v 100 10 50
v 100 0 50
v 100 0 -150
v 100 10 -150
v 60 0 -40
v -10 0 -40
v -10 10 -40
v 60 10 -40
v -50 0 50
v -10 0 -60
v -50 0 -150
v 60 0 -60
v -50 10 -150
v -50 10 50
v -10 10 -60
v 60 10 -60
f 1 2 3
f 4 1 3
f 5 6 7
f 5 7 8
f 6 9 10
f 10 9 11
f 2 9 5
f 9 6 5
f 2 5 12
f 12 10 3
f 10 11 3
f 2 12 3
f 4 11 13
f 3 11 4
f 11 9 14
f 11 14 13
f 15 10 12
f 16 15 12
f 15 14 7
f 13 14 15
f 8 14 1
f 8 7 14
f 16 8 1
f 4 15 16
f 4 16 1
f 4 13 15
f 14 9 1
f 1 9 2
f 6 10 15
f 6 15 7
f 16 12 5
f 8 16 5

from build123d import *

# Parameters (mm, degrees)
SKIZZE1_W                            = 150
SKIZZE1_H                            = 200
AUFSATZ_LINEAR_AUSTRAGEN1_DEPTH      = 10
SKIZZE2_W                            = 70
SKIZZE2_H                            = 20
SCHNITT_LINEAR_AUSTRAGEN2_DEPTH      = 1
SCHNITT_LINEAR_AUSTRAGEN2_DEPTH_BACK = 11


with BuildPart() as part:
    # Skizze1 → Aufsatz-Linear austragen1 (new body)
    with BuildSketch(Plane(origin=(0, 0, 0), x_dir=(1, 0, 0), z_dir=(0, 1, 0))):
        with Locations((25, 50)):
            Rectangle(SKIZZE1_W, SKIZZE1_H)
    extrude(amount=AUFSATZ_LINEAR_AUSTRAGEN1_DEPTH)

    # Skizze2 → Schnitt-Linear austragen2 (cut, two sides)
    with BuildSketch(Plane.XZ) as schnitt_linear_austragen2_sk:
        with Locations((25, -50)):
            Rectangle(SKIZZE2_W, SKIZZE2_H)
    extrude(amount=SCHNITT_LINEAR_AUSTRAGEN2_DEPTH, mode=Mode.SUBTRACT)
    extrude(schnitt_linear_austragen2_sk.sketch, amount=-SCHNITT_LINEAR_AUSTRAGEN2_DEPTH_BACK, mode=Mode.SUBTRACT)


solid = part.part
